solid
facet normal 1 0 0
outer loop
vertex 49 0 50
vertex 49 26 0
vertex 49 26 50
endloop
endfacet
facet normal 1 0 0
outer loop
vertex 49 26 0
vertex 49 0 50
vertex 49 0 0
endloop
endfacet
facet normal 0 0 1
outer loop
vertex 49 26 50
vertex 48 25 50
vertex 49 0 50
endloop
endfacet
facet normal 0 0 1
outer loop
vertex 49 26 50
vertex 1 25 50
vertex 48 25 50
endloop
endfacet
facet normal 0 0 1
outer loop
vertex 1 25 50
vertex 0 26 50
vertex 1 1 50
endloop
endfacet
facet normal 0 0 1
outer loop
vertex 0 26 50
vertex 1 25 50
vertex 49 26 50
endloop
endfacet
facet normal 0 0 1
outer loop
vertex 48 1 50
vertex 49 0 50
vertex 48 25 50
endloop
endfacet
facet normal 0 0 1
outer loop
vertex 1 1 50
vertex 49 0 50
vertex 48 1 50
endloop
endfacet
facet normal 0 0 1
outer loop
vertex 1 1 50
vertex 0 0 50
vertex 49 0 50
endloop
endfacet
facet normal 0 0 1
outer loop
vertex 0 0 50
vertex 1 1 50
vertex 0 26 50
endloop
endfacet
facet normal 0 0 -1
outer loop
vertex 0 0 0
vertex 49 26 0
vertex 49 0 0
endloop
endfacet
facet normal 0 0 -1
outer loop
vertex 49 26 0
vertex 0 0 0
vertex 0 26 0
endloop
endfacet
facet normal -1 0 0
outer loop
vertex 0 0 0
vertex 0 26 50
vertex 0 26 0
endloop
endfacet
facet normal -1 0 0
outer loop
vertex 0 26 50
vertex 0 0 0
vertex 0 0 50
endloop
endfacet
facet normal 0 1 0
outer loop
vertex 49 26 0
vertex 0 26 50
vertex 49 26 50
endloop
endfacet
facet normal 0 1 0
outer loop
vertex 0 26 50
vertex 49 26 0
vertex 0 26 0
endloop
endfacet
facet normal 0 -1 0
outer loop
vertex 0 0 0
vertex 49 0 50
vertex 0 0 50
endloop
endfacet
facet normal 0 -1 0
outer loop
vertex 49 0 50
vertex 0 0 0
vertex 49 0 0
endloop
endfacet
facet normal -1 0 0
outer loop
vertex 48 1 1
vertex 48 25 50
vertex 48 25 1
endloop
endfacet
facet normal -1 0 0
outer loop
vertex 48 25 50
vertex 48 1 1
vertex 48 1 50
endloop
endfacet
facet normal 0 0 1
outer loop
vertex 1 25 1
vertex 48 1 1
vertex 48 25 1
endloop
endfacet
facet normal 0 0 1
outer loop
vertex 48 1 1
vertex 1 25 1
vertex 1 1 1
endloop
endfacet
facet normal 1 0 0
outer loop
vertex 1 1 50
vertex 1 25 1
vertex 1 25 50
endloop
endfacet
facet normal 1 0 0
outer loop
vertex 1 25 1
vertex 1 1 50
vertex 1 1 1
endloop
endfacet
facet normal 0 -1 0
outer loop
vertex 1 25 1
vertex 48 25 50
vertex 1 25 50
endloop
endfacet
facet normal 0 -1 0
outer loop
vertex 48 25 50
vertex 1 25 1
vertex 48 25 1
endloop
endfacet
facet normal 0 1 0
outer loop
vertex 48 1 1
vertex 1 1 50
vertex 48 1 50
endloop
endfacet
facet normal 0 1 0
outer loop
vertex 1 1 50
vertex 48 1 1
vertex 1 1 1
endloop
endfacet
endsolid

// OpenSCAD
for(i = [0:0]){
    for(j = [0:0]){
        translate([i*50,j*25,0])
        difference(){
        cube([49,26,50]);
        translate([1,1,1])
        cube([47,24,49]);
    }
}
}
